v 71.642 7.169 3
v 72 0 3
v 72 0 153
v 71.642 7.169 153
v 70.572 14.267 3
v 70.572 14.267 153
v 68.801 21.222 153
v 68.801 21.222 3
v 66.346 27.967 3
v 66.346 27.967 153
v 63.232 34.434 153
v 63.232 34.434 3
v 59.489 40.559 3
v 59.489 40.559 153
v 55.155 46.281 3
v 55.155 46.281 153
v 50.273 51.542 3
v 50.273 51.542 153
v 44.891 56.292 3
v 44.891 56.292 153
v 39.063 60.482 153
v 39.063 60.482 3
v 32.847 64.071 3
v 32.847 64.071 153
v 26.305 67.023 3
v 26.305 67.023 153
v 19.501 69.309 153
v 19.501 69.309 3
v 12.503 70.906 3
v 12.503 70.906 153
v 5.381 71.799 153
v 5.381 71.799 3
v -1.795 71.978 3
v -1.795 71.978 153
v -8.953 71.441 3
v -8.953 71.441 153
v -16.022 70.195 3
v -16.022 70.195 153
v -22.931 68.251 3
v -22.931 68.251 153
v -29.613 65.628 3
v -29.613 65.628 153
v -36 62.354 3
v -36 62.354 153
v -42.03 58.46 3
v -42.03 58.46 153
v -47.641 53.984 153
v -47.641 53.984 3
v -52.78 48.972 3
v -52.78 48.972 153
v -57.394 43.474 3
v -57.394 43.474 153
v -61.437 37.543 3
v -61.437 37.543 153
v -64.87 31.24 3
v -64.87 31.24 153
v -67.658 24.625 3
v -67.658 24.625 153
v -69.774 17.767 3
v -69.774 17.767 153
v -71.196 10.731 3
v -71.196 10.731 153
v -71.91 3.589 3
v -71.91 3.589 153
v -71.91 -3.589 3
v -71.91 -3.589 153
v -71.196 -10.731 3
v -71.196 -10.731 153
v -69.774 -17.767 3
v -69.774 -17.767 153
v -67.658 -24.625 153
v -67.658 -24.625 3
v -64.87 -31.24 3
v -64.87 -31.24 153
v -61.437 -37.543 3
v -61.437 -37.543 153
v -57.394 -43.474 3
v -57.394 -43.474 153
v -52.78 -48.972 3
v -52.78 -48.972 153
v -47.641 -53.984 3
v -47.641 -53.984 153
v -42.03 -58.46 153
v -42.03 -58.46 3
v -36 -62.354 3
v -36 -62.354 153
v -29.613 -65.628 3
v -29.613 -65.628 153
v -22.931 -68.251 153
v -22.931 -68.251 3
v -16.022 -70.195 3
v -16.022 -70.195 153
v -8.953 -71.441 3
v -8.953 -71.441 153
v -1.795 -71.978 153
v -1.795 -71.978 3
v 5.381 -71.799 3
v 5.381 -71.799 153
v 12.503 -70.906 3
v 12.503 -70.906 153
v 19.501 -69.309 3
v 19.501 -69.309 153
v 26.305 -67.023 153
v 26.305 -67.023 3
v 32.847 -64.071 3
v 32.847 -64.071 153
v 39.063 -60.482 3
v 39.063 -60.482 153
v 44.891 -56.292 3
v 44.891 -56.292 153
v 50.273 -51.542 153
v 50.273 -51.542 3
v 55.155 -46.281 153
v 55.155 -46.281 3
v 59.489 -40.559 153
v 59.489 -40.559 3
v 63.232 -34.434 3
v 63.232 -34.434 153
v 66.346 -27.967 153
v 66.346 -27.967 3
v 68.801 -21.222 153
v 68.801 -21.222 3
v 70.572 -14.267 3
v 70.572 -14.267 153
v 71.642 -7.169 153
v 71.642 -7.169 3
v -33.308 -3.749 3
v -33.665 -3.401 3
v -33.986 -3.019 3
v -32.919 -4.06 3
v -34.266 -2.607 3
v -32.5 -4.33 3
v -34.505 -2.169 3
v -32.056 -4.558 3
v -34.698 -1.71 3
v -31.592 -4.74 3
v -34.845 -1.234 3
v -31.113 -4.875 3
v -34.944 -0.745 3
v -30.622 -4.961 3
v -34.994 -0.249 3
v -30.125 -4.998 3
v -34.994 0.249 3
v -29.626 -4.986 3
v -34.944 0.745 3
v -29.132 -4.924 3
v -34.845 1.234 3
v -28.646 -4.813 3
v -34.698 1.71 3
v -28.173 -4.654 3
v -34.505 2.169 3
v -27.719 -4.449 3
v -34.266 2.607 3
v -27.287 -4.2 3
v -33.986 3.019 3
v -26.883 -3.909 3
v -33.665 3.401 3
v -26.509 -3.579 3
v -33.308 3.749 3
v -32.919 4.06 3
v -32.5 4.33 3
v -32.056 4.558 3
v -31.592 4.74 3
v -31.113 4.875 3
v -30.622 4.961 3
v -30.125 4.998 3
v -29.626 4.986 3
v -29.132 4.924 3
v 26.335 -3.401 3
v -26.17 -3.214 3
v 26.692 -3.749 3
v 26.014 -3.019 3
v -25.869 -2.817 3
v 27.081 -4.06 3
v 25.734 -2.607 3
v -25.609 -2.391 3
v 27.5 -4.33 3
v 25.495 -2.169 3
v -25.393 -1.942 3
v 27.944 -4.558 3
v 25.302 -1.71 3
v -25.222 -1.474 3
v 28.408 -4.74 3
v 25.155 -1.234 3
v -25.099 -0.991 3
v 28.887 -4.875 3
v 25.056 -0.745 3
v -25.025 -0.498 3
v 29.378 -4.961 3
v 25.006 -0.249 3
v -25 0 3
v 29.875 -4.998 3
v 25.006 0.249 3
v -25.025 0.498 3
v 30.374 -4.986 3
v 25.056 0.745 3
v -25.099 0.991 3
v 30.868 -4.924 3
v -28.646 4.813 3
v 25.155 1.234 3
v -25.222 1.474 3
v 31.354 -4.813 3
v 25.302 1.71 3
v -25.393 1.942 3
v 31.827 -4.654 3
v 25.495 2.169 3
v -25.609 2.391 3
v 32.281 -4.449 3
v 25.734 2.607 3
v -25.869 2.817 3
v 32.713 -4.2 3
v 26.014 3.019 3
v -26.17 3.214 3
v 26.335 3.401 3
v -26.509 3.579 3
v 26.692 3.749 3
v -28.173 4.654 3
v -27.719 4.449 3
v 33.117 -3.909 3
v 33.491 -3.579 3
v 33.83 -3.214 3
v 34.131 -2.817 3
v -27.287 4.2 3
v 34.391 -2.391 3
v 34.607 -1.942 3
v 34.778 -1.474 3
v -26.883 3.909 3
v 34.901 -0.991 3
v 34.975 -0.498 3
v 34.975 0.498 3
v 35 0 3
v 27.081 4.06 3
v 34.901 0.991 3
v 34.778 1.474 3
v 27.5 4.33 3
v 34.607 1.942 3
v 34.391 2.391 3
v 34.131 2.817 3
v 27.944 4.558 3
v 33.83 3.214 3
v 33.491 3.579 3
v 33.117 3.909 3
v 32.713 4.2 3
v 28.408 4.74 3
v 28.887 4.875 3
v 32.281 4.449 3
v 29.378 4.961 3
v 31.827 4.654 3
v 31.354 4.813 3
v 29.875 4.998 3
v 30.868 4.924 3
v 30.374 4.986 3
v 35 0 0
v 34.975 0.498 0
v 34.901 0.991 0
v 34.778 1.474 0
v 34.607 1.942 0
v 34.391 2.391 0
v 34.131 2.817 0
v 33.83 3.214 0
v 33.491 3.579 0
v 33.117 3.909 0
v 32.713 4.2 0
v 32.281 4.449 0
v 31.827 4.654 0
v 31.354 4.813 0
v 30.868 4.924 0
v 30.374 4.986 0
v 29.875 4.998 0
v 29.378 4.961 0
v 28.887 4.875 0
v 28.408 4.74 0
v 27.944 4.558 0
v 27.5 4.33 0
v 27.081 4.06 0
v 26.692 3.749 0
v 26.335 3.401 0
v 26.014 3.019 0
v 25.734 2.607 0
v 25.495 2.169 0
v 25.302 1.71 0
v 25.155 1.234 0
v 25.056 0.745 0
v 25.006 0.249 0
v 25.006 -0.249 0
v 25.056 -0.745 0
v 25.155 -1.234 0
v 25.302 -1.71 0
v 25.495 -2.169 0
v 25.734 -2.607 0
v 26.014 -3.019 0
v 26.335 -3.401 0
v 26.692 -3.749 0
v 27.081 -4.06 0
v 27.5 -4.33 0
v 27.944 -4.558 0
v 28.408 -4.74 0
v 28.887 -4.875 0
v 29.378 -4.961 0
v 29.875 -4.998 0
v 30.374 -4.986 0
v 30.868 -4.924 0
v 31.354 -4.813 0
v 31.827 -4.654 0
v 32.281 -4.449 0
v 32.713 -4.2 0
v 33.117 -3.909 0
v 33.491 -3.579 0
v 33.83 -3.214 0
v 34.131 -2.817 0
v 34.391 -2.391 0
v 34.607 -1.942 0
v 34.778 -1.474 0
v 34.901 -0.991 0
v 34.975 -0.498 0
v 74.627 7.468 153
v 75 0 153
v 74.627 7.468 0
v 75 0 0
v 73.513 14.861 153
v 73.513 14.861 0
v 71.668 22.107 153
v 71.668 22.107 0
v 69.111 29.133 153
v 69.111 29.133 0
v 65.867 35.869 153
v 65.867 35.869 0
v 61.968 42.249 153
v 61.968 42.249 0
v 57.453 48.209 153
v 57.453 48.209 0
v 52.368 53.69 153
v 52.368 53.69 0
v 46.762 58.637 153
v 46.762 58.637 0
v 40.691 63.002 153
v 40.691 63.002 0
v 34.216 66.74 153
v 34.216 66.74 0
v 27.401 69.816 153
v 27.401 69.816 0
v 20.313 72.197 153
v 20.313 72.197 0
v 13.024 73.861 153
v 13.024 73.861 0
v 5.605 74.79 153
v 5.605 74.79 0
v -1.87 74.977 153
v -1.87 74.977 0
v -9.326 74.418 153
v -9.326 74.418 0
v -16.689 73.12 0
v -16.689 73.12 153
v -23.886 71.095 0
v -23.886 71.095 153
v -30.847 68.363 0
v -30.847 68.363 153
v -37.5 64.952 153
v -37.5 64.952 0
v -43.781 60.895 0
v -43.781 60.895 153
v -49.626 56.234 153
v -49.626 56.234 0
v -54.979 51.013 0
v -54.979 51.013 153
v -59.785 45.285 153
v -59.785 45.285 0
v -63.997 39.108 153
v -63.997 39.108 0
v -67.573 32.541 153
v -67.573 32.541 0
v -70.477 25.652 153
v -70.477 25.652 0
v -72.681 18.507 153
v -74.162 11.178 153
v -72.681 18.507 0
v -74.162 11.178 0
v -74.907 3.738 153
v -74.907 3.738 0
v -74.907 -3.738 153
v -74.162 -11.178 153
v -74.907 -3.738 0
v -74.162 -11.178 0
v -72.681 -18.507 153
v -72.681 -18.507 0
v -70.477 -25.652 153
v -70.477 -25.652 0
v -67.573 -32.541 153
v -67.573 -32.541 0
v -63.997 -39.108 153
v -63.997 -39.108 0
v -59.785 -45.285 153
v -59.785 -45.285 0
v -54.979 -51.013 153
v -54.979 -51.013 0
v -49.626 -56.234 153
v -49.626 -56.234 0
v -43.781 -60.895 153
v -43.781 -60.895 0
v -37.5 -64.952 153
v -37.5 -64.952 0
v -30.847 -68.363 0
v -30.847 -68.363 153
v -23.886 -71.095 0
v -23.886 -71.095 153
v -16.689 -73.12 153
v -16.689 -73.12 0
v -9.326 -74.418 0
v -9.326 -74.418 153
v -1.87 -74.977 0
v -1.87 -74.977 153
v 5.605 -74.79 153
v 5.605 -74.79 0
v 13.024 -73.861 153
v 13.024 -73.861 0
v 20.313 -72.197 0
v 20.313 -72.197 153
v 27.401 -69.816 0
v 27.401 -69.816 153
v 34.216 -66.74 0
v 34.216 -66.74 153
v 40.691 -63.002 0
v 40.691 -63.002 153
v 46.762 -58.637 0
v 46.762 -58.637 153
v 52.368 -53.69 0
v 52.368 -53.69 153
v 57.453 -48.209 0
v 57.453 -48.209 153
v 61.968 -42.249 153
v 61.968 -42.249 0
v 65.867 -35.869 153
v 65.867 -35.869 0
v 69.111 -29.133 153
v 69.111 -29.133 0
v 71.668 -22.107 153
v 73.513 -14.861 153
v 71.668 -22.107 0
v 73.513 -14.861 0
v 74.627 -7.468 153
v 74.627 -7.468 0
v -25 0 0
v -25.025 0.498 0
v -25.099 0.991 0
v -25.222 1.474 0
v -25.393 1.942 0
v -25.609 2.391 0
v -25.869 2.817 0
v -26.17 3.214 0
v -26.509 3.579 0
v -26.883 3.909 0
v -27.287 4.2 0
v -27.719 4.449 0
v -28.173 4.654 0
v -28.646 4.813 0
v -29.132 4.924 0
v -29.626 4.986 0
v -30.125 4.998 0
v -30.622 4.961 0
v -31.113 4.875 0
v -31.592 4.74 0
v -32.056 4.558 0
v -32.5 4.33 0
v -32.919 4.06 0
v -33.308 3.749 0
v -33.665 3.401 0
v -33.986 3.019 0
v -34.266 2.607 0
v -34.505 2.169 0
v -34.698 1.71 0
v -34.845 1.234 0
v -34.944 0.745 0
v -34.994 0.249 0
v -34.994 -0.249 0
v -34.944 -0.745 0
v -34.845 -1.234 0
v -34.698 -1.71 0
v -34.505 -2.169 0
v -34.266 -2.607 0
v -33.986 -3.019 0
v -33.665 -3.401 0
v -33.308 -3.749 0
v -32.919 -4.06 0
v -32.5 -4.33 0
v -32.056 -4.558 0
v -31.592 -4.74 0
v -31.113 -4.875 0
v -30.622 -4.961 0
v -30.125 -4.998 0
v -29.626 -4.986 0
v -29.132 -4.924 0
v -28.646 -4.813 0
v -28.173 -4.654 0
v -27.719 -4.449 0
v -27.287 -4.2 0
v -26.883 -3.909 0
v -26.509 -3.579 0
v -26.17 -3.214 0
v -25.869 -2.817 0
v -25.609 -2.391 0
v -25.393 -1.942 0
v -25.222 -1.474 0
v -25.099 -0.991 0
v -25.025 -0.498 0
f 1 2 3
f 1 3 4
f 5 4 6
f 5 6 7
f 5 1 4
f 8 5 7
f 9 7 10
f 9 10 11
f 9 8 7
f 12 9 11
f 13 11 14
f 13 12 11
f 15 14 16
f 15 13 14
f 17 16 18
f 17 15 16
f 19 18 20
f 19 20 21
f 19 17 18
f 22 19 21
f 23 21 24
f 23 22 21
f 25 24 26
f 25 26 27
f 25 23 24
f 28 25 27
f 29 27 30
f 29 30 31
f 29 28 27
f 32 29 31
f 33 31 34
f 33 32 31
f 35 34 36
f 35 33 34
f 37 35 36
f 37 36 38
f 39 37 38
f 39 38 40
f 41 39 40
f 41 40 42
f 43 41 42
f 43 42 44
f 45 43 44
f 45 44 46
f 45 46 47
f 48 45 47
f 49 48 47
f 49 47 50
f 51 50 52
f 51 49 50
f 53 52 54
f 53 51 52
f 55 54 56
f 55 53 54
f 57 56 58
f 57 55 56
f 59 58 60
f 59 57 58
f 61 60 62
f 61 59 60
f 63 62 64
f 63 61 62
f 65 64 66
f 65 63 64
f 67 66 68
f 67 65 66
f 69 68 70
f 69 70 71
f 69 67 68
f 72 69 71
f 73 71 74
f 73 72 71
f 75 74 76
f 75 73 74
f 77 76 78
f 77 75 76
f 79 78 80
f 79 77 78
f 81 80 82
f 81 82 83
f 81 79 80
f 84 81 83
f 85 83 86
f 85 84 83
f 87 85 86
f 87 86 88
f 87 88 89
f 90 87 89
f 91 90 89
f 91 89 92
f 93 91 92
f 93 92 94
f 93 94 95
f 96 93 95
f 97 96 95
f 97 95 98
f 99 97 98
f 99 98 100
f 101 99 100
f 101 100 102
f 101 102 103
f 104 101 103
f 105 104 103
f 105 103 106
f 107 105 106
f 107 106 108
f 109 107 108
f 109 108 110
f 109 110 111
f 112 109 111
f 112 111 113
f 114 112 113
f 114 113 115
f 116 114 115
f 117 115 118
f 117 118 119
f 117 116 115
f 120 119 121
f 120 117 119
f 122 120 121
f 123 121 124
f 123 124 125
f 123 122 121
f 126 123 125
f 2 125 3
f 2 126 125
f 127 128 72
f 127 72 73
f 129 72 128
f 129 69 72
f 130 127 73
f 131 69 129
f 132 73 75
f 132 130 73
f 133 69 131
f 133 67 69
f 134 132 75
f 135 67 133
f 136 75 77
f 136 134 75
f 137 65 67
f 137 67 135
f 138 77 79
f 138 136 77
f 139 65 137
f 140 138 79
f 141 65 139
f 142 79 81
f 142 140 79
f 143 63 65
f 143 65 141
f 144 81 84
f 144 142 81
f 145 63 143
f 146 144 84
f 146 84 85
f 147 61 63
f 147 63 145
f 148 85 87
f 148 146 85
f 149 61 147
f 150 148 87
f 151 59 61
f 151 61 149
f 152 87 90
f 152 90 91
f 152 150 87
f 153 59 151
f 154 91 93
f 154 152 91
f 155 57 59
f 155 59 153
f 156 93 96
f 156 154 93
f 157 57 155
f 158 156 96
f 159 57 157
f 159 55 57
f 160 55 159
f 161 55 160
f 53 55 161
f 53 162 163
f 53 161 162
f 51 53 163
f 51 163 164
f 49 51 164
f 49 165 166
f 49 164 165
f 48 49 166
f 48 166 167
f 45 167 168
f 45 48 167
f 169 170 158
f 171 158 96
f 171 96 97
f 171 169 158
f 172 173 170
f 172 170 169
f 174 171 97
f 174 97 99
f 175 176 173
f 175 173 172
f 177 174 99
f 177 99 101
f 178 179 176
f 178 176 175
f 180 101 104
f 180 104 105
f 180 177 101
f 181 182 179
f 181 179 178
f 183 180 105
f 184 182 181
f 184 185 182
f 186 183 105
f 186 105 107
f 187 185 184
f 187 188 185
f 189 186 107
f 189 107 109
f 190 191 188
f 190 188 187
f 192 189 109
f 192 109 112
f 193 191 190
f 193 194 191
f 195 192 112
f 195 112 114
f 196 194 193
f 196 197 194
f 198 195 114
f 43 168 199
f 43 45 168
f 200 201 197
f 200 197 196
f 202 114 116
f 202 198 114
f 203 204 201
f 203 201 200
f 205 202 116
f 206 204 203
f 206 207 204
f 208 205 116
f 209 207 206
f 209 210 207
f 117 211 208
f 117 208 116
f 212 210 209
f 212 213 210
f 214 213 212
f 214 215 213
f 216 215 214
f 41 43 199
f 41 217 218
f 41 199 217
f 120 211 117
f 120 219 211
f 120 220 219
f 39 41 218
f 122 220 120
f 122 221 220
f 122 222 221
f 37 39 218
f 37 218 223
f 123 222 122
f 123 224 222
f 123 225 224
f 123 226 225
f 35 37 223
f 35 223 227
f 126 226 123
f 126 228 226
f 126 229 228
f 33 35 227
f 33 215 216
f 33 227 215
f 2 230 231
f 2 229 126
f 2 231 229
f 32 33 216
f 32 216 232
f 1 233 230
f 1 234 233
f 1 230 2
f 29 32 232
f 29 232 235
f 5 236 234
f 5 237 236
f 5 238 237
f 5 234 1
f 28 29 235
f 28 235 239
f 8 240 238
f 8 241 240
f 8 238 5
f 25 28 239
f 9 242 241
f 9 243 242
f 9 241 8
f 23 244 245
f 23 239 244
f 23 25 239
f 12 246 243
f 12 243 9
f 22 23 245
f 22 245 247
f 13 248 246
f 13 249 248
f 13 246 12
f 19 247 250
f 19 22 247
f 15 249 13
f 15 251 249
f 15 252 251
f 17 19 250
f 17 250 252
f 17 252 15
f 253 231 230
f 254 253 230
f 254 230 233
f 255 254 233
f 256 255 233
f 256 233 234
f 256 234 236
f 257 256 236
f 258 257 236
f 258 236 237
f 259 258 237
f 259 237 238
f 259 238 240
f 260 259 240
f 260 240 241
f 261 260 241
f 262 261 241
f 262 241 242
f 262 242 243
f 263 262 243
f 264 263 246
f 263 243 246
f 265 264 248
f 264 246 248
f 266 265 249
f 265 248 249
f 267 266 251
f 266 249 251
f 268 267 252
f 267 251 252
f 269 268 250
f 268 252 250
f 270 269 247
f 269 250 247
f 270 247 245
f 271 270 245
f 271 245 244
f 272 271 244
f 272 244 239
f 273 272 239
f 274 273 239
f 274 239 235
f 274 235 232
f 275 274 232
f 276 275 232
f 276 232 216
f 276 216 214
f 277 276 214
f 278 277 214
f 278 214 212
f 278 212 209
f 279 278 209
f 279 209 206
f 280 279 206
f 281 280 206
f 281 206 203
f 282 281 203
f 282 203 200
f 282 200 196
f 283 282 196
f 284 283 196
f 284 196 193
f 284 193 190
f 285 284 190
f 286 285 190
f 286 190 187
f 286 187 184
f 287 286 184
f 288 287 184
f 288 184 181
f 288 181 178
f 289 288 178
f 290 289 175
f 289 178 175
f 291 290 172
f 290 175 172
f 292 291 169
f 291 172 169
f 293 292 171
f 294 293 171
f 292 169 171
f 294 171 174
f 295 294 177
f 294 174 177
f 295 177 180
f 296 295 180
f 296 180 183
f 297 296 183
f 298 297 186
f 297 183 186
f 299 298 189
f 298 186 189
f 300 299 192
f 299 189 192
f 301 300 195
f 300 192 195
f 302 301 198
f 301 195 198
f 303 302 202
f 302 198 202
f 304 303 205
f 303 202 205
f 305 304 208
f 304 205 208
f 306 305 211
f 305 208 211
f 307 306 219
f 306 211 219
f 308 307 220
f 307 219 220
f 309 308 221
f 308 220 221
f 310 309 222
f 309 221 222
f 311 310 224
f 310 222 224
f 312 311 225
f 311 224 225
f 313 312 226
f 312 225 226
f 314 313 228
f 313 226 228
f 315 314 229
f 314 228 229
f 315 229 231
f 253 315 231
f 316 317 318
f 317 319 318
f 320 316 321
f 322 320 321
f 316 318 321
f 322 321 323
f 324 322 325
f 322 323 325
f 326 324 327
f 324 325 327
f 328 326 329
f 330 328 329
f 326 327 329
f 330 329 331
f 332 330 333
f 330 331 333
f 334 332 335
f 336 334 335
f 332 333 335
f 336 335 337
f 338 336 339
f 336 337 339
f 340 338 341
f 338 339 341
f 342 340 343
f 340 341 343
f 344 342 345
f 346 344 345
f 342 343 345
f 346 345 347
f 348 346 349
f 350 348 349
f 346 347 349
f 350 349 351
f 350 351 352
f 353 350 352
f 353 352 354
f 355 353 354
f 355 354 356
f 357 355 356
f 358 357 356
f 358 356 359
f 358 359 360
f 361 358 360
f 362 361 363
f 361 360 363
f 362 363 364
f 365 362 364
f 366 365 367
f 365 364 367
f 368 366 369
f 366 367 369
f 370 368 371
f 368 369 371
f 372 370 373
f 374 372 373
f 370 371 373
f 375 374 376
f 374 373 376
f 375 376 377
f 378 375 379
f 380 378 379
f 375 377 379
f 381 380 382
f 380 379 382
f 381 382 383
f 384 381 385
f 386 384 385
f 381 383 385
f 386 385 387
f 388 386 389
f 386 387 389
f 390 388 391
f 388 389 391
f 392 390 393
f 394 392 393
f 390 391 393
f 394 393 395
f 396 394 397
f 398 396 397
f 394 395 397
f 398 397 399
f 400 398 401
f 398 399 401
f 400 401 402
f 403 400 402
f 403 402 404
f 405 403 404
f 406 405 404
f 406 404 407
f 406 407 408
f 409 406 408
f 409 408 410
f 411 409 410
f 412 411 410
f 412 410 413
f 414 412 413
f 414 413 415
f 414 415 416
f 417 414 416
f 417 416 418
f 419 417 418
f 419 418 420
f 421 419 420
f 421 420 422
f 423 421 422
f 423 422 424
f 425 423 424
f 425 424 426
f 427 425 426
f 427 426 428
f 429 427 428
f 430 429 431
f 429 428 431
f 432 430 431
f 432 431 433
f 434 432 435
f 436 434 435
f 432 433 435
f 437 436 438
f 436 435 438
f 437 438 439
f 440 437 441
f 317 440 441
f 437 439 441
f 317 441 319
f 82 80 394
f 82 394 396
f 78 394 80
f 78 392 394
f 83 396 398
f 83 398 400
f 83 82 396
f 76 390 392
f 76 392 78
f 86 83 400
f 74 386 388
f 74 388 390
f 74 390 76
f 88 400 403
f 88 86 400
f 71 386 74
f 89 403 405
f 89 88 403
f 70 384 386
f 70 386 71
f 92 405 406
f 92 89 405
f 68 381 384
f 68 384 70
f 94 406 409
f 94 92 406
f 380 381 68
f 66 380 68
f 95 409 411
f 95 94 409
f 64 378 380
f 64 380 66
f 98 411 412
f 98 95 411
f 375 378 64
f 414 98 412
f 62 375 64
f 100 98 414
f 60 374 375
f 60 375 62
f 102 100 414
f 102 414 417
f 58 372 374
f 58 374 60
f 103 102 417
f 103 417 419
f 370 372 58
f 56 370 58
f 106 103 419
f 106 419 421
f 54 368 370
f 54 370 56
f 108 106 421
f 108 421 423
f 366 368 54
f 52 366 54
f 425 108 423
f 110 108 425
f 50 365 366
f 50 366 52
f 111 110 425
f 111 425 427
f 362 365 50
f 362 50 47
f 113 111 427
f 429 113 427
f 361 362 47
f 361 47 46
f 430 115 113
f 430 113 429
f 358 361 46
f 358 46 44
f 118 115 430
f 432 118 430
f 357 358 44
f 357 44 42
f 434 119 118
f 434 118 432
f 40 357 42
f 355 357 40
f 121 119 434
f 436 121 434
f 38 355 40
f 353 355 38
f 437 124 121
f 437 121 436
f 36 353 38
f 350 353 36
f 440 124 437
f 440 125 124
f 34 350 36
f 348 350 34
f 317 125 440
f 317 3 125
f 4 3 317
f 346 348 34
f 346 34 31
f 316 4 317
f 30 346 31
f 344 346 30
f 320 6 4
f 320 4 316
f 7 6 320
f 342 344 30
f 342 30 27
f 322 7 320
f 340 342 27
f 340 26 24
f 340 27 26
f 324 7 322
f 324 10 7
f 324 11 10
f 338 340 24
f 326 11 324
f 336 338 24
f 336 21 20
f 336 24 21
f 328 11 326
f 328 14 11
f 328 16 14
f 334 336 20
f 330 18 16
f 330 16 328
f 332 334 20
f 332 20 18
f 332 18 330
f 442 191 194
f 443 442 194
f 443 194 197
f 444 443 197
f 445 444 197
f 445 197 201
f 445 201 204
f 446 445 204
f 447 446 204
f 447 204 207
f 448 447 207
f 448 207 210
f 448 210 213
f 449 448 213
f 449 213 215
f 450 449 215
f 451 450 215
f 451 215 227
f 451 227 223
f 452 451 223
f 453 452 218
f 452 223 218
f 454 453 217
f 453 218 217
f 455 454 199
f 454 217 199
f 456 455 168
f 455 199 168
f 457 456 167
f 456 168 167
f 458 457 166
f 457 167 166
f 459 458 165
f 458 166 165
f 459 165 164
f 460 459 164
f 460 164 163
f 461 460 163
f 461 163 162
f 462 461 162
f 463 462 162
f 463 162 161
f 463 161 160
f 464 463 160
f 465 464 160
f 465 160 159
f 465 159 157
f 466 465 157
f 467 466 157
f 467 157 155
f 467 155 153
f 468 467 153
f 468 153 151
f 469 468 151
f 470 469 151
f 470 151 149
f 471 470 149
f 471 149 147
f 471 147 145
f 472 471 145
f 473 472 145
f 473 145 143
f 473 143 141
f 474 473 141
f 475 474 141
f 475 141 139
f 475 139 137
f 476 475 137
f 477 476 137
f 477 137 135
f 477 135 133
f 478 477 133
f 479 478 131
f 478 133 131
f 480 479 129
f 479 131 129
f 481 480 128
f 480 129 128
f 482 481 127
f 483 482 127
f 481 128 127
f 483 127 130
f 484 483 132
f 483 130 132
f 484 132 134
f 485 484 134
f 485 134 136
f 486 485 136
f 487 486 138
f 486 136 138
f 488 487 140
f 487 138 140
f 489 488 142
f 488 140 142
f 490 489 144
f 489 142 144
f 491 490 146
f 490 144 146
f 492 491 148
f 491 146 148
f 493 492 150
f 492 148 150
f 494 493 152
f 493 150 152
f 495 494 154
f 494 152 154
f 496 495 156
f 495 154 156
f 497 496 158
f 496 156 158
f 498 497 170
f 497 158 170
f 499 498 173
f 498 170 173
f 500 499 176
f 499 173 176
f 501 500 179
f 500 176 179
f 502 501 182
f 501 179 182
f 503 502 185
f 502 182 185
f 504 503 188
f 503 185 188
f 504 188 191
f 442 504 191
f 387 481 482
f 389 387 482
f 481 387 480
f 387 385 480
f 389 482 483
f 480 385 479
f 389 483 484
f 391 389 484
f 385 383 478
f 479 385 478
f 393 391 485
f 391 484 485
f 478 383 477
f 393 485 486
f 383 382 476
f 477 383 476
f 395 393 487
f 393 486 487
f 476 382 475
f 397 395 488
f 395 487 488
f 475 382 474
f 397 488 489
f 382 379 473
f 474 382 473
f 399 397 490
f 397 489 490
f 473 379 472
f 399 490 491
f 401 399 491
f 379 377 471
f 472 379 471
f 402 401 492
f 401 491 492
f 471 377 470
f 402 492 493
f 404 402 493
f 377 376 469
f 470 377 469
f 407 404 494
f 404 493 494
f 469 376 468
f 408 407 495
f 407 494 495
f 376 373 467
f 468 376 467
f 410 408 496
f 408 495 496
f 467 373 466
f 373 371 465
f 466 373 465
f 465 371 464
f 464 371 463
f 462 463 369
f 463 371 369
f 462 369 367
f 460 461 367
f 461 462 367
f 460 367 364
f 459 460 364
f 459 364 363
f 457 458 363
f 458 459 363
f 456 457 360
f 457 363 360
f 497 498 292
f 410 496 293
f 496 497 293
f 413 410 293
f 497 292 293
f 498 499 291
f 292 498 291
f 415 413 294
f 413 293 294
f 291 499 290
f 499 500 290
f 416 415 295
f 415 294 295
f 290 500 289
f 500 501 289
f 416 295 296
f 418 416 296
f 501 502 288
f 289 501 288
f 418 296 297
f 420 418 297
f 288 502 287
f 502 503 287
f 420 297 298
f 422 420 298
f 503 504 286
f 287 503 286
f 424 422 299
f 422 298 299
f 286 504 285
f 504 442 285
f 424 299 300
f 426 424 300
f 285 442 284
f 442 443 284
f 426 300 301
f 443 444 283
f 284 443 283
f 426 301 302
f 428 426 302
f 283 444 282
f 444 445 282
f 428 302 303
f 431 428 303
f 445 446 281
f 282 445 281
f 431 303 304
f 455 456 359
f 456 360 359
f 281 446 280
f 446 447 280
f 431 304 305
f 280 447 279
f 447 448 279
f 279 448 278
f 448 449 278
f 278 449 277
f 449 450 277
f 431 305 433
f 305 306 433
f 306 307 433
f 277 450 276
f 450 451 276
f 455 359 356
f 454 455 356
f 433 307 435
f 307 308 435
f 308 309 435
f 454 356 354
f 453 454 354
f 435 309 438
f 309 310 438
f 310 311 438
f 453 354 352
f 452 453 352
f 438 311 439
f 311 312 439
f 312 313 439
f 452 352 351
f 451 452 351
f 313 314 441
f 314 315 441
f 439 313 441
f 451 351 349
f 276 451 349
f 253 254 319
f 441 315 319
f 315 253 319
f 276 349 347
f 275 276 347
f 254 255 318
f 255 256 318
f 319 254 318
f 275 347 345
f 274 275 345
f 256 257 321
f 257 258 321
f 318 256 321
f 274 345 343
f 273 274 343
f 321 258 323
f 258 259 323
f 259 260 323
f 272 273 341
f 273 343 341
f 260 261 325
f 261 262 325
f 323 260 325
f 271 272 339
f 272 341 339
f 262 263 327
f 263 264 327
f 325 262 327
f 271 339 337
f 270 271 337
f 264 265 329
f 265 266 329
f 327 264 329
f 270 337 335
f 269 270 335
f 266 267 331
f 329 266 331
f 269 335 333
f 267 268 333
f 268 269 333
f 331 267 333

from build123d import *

# Parameters (mm, degrees)
SKETCH1_R           = 75
BOSS_EXTRUDE1_DEPTH = 3
SKETCH2_R           = 75
SKETCH2_R_2         = 72
BOSS_EXTRUDE2_DEPTH = 150
SKETCH3_R           = 5
CUT_EXTRUDE1_DEPTH  = 150


with BuildPart() as part:
    # Sketch1 → Boss-Extrude1 (new body)
    with BuildSketch(Plane.XY):
        Circle(SKETCH1_R)
    extrude(amount=BOSS_EXTRUDE1_DEPTH)

    # Sketch2 → Boss-Extrude2 (add)
    with BuildSketch(Plane.XY.offset(3)):
        Circle(SKETCH2_R)
        Circle(SKETCH2_R_2, mode=Mode.SUBTRACT)
    extrude(amount=BOSS_EXTRUDE2_DEPTH)

    # Sketch3 → Cut-Extrude1 (cut)
    with BuildSketch(Plane.XY.offset(3)):
        with Locations((30, 0)):
            Circle(SKETCH3_R)
        with Locations((-30, 0)):
            Circle(SKETCH3_R)
    extrude(amount=-CUT_EXTRUDE1_DEPTH, mode=Mode.SUBTRACT)


solid = part.part
